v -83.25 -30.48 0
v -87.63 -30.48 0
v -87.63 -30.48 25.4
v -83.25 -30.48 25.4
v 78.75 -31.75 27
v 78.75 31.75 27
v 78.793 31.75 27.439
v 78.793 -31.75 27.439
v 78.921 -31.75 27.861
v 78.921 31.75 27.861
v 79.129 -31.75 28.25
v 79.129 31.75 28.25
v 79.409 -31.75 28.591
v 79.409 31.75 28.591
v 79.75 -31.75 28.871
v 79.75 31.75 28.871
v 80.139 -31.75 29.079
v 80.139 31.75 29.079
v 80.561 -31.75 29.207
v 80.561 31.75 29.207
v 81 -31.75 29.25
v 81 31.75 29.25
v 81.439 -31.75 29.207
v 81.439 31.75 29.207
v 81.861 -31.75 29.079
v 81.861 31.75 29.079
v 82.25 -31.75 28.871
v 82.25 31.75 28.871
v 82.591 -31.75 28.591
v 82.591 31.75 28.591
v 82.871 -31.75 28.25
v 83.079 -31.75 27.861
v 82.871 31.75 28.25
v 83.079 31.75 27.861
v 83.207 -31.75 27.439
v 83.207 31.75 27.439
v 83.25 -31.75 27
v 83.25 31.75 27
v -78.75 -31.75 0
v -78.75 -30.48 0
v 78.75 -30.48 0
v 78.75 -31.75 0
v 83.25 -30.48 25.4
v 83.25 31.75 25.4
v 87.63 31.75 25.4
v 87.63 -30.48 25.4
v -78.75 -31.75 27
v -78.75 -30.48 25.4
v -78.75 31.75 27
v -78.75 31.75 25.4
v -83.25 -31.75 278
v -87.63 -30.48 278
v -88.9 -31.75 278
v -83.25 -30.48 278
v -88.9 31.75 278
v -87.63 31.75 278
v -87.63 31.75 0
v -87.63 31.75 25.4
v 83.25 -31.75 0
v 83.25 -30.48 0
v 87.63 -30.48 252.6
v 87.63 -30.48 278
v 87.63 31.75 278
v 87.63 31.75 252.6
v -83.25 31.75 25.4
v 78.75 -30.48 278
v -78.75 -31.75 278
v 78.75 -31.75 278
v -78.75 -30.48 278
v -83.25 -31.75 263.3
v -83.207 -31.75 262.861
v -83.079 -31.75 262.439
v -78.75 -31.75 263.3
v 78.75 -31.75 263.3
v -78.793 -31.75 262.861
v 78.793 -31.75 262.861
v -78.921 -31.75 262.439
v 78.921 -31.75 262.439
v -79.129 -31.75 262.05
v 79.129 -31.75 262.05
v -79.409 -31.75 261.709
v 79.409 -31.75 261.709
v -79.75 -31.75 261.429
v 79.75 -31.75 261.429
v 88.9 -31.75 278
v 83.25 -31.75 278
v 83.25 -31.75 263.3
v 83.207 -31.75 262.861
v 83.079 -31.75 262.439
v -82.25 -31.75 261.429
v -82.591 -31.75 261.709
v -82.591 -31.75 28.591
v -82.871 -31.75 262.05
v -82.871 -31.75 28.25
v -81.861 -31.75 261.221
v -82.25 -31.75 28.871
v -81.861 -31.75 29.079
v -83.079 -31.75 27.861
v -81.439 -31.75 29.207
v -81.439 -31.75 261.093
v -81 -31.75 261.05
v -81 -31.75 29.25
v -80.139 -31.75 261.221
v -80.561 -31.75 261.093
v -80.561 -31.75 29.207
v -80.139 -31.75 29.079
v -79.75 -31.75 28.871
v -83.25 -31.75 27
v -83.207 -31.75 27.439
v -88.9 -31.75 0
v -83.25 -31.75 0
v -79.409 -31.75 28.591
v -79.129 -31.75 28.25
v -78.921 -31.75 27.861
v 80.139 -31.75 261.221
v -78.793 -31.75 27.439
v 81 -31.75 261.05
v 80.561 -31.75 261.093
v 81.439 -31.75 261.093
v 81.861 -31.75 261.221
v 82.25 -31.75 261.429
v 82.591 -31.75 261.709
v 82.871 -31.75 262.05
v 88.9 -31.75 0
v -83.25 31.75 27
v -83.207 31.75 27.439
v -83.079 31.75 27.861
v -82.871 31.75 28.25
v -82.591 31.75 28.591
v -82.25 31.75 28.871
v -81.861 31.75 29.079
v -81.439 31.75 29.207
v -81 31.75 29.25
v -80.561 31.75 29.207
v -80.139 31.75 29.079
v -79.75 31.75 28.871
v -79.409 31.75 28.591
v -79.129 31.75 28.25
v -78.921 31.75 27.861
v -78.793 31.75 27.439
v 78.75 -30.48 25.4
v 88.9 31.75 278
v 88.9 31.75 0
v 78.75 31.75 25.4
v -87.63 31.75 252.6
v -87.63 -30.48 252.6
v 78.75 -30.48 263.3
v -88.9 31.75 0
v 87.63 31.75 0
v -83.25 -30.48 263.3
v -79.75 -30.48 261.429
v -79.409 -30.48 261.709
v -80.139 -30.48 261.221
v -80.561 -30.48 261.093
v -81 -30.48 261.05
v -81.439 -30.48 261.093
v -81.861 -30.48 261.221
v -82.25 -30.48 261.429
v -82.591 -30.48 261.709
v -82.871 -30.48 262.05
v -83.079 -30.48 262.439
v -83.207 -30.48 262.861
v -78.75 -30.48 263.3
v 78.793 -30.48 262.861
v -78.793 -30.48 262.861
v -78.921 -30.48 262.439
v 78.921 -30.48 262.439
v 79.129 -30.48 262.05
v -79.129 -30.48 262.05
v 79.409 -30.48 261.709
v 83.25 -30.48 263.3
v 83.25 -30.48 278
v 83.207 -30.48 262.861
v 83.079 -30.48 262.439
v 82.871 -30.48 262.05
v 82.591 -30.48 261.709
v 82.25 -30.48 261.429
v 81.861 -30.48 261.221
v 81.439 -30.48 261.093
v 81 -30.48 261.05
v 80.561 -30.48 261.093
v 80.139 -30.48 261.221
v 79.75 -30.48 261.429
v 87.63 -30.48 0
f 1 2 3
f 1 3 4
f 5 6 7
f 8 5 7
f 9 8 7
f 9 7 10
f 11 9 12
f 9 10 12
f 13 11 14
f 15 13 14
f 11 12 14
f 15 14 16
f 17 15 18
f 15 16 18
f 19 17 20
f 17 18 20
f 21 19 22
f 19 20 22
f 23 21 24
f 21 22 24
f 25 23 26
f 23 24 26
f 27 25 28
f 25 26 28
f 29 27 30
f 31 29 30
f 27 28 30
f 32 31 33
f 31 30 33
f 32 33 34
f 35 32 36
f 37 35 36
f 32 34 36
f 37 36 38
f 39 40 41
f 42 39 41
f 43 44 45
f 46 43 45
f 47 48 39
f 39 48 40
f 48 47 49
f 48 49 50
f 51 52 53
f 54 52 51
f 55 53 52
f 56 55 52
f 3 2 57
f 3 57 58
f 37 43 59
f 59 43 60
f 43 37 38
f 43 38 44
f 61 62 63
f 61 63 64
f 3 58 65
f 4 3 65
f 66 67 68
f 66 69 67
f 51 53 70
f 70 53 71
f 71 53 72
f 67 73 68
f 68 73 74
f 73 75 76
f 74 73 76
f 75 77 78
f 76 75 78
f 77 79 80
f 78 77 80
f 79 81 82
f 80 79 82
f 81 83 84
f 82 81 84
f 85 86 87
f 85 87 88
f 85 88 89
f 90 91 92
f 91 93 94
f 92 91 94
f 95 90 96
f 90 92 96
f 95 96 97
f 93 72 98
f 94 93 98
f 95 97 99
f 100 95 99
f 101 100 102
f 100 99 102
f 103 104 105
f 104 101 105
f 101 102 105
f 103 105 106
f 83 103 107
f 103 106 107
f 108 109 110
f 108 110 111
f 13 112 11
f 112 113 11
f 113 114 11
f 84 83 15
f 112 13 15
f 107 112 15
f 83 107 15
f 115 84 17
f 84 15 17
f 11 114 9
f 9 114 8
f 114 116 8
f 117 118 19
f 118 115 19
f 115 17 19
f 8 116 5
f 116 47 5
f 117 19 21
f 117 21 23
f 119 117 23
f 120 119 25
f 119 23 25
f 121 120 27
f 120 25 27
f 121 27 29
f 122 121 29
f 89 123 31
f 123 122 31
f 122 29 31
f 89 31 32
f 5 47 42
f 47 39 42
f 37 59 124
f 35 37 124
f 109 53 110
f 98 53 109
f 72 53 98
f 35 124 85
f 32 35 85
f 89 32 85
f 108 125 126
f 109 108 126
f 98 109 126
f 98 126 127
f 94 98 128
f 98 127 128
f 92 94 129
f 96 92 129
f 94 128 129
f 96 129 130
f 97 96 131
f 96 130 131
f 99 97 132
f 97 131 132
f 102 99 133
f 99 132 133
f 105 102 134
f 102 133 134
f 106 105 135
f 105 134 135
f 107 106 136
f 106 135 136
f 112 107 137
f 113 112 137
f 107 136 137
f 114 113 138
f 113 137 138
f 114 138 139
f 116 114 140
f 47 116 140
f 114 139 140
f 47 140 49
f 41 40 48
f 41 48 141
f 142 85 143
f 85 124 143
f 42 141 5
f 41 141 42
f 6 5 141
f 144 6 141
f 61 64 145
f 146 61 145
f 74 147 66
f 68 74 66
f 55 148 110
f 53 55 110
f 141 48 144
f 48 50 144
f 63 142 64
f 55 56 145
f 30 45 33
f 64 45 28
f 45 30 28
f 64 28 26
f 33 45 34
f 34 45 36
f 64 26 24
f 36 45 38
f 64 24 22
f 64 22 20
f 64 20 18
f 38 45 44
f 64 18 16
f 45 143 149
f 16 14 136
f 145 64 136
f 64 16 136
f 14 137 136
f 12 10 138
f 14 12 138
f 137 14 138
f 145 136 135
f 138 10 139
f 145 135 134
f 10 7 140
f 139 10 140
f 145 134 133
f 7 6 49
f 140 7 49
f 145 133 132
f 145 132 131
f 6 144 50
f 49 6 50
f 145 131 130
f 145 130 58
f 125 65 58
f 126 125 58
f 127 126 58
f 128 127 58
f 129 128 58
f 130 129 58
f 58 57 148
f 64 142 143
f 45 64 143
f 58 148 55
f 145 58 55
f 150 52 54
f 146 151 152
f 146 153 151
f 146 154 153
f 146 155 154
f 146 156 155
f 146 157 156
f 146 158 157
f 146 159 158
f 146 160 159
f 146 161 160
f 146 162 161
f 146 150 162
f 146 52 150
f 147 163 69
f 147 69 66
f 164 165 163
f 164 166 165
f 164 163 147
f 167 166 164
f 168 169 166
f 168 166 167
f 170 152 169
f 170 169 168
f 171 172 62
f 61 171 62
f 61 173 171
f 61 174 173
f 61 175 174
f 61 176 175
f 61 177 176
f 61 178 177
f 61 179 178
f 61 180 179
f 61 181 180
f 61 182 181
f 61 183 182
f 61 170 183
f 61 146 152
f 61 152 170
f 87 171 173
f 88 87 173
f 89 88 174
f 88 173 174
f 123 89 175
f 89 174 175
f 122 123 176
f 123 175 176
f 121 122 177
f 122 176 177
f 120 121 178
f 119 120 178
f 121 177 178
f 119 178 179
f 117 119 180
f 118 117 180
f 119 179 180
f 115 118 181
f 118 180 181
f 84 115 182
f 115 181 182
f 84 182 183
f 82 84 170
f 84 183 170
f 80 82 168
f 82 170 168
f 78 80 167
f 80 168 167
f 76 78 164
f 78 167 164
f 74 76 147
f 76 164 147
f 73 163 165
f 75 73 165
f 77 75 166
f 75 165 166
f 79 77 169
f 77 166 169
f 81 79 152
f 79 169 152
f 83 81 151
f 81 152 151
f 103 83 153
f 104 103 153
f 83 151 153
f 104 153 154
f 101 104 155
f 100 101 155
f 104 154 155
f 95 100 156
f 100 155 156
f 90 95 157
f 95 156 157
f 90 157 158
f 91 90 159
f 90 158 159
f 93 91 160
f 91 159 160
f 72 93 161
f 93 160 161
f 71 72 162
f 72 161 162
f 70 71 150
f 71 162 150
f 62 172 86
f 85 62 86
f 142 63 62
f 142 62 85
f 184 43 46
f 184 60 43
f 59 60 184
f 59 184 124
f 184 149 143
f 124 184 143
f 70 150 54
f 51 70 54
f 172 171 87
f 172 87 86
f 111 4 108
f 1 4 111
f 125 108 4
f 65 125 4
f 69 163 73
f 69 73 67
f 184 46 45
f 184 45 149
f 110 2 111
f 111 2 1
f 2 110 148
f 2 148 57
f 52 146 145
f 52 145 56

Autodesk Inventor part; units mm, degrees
ref_plane "YZ Plane" through (0, 0, 0) normal (1, 0, 0) x (0, 1, 0)
ref_plane "XZ Plane" through (0, 0, 0) normal (0, 1, 0) x (-1, 0, 0)
sketch "Sketch1" plane through (0, 0, 0) normal (0, 0, 1) x (1, 0, 0)
  line L0 (-88.9, -31.75) -> (88.9, -31.75)
  line L1 (88.9, -31.75) -> (88.9, 31.75)
  line L2 (88.9, 31.75) -> (-88.9, 31.75)
  line L3 (-88.9, 31.75) -> (-88.9, -31.75)
  line L4 (-88.9, -31.75) -> (88.9, 31.75) construction
  line L5 (88.9, -31.75) -> (-88.9, 31.75) construction
  point P0 (0, 0)
  dimension "d0" = 177.8
  dimension "d1" = 63.5
extrude "Extrusion1" add sketch "Sketch1" along normal blind 278
sketch "Sketch2" plane through (-88.9, 31.75, 0) normal (0, 1, 0) x (1, 0, 0)
  line L0 (177.8, -278) -> (0, -278) projected
  line L1 (177.8, 0) -> (0, 0) projected
  arc A0 (10.15, -263.3) -> (5.65, -263.3) centre (7.9, -263.3) ccw
  arc A1 (172.15, -263.3) -> (167.65, -263.3) centre (169.9, -263.3) ccw
  arc A2 (167.65, -27) -> (172.15, -27) centre (169.9, -27) ccw
  arc A3 (5.65, -27) -> (10.15, -27) centre (7.9, -27) ccw
  line L2 (7.9, -263.3) -> (7.9, -27) construction
  line L3 (7.9, -27) -> (169.9, -27) construction
  line L4 (169.9, -27) -> (169.9, -263.3) construction
  line L5 (7.9, -27) -> (7.9, 0) construction
  line L6 (7.9, -27) -> (0, 0) construction
  line L7 (169.9, -27) -> (177.8, 0) construction
  line L8 (167.65, -263.3) -> (167.65, -278)
  line L9 (172.15, -263.3) -> (172.15, -278)
  line L10 (5.65, -263.3) -> (5.65, -278)
  line L11 (10.15, -263.3) -> (10.15, -278)
  line L12 (10.15, -27) -> (10.15, 0)
  line L13 (5.65, -27) -> (5.65, 0)
  line L14 (172.15, -27) -> (172.15, 0)
  line L15 (167.65, -27) -> (167.65, 0)
  point P0 (88.9, 0)
  dimension "d4" = 2.25
  dimension "d5" = 236.3
  dimension "d6" = 162
  dimension "d14" = 27
extrude "Extrusion2" cut sketch "Sketch2" against normal up to surface (63.5 mm away)
ref_plane "Work Plane1" through (88.9, -30.48, 0) normal (0, -1, 0) x (1, 0, 0)
sketch "Sketch3" plane through (-88.9, 31.75, 278) normal (0, 1, 0) x (1, 0, 0)
  line L0 (0, 278) -> (0, 0) projected
  line L1 (177.8, 278) -> (177.8, 0) projected
  line L2 (176.53, 0) -> (176.53, 25.4)
  line L3 (176.53, 25.4) -> (1.27, 25.4)
  line L4 (1.27, 25.4) -> (1.27, 0)
  line L5 (1.27, 0) -> (176.53, 0)
  line L6 (1.27, 0) -> (0, 0) construction
  line L7 (177.8, 0) -> (176.53, 0) construction
  line L8 (1.27, 252.6) -> (176.53, 252.6)
  line L9 (176.53, 252.6) -> (176.53, 278)
  line L10 (176.53, 278) -> (1.27, 278)
  line L11 (1.27, 278) -> (1.27, 252.6)
  line L12 (1.27, 278) -> (0, 278) construction
  point P0 (88.9, 278)
  dimension "d9" = 1.27
  dimension "d10" = 25.4
extrude "Extrusion3" cut sketch "Sketch3" against normal up to surface (62.23 mm away)
properties part number "UHP-1500-230"
